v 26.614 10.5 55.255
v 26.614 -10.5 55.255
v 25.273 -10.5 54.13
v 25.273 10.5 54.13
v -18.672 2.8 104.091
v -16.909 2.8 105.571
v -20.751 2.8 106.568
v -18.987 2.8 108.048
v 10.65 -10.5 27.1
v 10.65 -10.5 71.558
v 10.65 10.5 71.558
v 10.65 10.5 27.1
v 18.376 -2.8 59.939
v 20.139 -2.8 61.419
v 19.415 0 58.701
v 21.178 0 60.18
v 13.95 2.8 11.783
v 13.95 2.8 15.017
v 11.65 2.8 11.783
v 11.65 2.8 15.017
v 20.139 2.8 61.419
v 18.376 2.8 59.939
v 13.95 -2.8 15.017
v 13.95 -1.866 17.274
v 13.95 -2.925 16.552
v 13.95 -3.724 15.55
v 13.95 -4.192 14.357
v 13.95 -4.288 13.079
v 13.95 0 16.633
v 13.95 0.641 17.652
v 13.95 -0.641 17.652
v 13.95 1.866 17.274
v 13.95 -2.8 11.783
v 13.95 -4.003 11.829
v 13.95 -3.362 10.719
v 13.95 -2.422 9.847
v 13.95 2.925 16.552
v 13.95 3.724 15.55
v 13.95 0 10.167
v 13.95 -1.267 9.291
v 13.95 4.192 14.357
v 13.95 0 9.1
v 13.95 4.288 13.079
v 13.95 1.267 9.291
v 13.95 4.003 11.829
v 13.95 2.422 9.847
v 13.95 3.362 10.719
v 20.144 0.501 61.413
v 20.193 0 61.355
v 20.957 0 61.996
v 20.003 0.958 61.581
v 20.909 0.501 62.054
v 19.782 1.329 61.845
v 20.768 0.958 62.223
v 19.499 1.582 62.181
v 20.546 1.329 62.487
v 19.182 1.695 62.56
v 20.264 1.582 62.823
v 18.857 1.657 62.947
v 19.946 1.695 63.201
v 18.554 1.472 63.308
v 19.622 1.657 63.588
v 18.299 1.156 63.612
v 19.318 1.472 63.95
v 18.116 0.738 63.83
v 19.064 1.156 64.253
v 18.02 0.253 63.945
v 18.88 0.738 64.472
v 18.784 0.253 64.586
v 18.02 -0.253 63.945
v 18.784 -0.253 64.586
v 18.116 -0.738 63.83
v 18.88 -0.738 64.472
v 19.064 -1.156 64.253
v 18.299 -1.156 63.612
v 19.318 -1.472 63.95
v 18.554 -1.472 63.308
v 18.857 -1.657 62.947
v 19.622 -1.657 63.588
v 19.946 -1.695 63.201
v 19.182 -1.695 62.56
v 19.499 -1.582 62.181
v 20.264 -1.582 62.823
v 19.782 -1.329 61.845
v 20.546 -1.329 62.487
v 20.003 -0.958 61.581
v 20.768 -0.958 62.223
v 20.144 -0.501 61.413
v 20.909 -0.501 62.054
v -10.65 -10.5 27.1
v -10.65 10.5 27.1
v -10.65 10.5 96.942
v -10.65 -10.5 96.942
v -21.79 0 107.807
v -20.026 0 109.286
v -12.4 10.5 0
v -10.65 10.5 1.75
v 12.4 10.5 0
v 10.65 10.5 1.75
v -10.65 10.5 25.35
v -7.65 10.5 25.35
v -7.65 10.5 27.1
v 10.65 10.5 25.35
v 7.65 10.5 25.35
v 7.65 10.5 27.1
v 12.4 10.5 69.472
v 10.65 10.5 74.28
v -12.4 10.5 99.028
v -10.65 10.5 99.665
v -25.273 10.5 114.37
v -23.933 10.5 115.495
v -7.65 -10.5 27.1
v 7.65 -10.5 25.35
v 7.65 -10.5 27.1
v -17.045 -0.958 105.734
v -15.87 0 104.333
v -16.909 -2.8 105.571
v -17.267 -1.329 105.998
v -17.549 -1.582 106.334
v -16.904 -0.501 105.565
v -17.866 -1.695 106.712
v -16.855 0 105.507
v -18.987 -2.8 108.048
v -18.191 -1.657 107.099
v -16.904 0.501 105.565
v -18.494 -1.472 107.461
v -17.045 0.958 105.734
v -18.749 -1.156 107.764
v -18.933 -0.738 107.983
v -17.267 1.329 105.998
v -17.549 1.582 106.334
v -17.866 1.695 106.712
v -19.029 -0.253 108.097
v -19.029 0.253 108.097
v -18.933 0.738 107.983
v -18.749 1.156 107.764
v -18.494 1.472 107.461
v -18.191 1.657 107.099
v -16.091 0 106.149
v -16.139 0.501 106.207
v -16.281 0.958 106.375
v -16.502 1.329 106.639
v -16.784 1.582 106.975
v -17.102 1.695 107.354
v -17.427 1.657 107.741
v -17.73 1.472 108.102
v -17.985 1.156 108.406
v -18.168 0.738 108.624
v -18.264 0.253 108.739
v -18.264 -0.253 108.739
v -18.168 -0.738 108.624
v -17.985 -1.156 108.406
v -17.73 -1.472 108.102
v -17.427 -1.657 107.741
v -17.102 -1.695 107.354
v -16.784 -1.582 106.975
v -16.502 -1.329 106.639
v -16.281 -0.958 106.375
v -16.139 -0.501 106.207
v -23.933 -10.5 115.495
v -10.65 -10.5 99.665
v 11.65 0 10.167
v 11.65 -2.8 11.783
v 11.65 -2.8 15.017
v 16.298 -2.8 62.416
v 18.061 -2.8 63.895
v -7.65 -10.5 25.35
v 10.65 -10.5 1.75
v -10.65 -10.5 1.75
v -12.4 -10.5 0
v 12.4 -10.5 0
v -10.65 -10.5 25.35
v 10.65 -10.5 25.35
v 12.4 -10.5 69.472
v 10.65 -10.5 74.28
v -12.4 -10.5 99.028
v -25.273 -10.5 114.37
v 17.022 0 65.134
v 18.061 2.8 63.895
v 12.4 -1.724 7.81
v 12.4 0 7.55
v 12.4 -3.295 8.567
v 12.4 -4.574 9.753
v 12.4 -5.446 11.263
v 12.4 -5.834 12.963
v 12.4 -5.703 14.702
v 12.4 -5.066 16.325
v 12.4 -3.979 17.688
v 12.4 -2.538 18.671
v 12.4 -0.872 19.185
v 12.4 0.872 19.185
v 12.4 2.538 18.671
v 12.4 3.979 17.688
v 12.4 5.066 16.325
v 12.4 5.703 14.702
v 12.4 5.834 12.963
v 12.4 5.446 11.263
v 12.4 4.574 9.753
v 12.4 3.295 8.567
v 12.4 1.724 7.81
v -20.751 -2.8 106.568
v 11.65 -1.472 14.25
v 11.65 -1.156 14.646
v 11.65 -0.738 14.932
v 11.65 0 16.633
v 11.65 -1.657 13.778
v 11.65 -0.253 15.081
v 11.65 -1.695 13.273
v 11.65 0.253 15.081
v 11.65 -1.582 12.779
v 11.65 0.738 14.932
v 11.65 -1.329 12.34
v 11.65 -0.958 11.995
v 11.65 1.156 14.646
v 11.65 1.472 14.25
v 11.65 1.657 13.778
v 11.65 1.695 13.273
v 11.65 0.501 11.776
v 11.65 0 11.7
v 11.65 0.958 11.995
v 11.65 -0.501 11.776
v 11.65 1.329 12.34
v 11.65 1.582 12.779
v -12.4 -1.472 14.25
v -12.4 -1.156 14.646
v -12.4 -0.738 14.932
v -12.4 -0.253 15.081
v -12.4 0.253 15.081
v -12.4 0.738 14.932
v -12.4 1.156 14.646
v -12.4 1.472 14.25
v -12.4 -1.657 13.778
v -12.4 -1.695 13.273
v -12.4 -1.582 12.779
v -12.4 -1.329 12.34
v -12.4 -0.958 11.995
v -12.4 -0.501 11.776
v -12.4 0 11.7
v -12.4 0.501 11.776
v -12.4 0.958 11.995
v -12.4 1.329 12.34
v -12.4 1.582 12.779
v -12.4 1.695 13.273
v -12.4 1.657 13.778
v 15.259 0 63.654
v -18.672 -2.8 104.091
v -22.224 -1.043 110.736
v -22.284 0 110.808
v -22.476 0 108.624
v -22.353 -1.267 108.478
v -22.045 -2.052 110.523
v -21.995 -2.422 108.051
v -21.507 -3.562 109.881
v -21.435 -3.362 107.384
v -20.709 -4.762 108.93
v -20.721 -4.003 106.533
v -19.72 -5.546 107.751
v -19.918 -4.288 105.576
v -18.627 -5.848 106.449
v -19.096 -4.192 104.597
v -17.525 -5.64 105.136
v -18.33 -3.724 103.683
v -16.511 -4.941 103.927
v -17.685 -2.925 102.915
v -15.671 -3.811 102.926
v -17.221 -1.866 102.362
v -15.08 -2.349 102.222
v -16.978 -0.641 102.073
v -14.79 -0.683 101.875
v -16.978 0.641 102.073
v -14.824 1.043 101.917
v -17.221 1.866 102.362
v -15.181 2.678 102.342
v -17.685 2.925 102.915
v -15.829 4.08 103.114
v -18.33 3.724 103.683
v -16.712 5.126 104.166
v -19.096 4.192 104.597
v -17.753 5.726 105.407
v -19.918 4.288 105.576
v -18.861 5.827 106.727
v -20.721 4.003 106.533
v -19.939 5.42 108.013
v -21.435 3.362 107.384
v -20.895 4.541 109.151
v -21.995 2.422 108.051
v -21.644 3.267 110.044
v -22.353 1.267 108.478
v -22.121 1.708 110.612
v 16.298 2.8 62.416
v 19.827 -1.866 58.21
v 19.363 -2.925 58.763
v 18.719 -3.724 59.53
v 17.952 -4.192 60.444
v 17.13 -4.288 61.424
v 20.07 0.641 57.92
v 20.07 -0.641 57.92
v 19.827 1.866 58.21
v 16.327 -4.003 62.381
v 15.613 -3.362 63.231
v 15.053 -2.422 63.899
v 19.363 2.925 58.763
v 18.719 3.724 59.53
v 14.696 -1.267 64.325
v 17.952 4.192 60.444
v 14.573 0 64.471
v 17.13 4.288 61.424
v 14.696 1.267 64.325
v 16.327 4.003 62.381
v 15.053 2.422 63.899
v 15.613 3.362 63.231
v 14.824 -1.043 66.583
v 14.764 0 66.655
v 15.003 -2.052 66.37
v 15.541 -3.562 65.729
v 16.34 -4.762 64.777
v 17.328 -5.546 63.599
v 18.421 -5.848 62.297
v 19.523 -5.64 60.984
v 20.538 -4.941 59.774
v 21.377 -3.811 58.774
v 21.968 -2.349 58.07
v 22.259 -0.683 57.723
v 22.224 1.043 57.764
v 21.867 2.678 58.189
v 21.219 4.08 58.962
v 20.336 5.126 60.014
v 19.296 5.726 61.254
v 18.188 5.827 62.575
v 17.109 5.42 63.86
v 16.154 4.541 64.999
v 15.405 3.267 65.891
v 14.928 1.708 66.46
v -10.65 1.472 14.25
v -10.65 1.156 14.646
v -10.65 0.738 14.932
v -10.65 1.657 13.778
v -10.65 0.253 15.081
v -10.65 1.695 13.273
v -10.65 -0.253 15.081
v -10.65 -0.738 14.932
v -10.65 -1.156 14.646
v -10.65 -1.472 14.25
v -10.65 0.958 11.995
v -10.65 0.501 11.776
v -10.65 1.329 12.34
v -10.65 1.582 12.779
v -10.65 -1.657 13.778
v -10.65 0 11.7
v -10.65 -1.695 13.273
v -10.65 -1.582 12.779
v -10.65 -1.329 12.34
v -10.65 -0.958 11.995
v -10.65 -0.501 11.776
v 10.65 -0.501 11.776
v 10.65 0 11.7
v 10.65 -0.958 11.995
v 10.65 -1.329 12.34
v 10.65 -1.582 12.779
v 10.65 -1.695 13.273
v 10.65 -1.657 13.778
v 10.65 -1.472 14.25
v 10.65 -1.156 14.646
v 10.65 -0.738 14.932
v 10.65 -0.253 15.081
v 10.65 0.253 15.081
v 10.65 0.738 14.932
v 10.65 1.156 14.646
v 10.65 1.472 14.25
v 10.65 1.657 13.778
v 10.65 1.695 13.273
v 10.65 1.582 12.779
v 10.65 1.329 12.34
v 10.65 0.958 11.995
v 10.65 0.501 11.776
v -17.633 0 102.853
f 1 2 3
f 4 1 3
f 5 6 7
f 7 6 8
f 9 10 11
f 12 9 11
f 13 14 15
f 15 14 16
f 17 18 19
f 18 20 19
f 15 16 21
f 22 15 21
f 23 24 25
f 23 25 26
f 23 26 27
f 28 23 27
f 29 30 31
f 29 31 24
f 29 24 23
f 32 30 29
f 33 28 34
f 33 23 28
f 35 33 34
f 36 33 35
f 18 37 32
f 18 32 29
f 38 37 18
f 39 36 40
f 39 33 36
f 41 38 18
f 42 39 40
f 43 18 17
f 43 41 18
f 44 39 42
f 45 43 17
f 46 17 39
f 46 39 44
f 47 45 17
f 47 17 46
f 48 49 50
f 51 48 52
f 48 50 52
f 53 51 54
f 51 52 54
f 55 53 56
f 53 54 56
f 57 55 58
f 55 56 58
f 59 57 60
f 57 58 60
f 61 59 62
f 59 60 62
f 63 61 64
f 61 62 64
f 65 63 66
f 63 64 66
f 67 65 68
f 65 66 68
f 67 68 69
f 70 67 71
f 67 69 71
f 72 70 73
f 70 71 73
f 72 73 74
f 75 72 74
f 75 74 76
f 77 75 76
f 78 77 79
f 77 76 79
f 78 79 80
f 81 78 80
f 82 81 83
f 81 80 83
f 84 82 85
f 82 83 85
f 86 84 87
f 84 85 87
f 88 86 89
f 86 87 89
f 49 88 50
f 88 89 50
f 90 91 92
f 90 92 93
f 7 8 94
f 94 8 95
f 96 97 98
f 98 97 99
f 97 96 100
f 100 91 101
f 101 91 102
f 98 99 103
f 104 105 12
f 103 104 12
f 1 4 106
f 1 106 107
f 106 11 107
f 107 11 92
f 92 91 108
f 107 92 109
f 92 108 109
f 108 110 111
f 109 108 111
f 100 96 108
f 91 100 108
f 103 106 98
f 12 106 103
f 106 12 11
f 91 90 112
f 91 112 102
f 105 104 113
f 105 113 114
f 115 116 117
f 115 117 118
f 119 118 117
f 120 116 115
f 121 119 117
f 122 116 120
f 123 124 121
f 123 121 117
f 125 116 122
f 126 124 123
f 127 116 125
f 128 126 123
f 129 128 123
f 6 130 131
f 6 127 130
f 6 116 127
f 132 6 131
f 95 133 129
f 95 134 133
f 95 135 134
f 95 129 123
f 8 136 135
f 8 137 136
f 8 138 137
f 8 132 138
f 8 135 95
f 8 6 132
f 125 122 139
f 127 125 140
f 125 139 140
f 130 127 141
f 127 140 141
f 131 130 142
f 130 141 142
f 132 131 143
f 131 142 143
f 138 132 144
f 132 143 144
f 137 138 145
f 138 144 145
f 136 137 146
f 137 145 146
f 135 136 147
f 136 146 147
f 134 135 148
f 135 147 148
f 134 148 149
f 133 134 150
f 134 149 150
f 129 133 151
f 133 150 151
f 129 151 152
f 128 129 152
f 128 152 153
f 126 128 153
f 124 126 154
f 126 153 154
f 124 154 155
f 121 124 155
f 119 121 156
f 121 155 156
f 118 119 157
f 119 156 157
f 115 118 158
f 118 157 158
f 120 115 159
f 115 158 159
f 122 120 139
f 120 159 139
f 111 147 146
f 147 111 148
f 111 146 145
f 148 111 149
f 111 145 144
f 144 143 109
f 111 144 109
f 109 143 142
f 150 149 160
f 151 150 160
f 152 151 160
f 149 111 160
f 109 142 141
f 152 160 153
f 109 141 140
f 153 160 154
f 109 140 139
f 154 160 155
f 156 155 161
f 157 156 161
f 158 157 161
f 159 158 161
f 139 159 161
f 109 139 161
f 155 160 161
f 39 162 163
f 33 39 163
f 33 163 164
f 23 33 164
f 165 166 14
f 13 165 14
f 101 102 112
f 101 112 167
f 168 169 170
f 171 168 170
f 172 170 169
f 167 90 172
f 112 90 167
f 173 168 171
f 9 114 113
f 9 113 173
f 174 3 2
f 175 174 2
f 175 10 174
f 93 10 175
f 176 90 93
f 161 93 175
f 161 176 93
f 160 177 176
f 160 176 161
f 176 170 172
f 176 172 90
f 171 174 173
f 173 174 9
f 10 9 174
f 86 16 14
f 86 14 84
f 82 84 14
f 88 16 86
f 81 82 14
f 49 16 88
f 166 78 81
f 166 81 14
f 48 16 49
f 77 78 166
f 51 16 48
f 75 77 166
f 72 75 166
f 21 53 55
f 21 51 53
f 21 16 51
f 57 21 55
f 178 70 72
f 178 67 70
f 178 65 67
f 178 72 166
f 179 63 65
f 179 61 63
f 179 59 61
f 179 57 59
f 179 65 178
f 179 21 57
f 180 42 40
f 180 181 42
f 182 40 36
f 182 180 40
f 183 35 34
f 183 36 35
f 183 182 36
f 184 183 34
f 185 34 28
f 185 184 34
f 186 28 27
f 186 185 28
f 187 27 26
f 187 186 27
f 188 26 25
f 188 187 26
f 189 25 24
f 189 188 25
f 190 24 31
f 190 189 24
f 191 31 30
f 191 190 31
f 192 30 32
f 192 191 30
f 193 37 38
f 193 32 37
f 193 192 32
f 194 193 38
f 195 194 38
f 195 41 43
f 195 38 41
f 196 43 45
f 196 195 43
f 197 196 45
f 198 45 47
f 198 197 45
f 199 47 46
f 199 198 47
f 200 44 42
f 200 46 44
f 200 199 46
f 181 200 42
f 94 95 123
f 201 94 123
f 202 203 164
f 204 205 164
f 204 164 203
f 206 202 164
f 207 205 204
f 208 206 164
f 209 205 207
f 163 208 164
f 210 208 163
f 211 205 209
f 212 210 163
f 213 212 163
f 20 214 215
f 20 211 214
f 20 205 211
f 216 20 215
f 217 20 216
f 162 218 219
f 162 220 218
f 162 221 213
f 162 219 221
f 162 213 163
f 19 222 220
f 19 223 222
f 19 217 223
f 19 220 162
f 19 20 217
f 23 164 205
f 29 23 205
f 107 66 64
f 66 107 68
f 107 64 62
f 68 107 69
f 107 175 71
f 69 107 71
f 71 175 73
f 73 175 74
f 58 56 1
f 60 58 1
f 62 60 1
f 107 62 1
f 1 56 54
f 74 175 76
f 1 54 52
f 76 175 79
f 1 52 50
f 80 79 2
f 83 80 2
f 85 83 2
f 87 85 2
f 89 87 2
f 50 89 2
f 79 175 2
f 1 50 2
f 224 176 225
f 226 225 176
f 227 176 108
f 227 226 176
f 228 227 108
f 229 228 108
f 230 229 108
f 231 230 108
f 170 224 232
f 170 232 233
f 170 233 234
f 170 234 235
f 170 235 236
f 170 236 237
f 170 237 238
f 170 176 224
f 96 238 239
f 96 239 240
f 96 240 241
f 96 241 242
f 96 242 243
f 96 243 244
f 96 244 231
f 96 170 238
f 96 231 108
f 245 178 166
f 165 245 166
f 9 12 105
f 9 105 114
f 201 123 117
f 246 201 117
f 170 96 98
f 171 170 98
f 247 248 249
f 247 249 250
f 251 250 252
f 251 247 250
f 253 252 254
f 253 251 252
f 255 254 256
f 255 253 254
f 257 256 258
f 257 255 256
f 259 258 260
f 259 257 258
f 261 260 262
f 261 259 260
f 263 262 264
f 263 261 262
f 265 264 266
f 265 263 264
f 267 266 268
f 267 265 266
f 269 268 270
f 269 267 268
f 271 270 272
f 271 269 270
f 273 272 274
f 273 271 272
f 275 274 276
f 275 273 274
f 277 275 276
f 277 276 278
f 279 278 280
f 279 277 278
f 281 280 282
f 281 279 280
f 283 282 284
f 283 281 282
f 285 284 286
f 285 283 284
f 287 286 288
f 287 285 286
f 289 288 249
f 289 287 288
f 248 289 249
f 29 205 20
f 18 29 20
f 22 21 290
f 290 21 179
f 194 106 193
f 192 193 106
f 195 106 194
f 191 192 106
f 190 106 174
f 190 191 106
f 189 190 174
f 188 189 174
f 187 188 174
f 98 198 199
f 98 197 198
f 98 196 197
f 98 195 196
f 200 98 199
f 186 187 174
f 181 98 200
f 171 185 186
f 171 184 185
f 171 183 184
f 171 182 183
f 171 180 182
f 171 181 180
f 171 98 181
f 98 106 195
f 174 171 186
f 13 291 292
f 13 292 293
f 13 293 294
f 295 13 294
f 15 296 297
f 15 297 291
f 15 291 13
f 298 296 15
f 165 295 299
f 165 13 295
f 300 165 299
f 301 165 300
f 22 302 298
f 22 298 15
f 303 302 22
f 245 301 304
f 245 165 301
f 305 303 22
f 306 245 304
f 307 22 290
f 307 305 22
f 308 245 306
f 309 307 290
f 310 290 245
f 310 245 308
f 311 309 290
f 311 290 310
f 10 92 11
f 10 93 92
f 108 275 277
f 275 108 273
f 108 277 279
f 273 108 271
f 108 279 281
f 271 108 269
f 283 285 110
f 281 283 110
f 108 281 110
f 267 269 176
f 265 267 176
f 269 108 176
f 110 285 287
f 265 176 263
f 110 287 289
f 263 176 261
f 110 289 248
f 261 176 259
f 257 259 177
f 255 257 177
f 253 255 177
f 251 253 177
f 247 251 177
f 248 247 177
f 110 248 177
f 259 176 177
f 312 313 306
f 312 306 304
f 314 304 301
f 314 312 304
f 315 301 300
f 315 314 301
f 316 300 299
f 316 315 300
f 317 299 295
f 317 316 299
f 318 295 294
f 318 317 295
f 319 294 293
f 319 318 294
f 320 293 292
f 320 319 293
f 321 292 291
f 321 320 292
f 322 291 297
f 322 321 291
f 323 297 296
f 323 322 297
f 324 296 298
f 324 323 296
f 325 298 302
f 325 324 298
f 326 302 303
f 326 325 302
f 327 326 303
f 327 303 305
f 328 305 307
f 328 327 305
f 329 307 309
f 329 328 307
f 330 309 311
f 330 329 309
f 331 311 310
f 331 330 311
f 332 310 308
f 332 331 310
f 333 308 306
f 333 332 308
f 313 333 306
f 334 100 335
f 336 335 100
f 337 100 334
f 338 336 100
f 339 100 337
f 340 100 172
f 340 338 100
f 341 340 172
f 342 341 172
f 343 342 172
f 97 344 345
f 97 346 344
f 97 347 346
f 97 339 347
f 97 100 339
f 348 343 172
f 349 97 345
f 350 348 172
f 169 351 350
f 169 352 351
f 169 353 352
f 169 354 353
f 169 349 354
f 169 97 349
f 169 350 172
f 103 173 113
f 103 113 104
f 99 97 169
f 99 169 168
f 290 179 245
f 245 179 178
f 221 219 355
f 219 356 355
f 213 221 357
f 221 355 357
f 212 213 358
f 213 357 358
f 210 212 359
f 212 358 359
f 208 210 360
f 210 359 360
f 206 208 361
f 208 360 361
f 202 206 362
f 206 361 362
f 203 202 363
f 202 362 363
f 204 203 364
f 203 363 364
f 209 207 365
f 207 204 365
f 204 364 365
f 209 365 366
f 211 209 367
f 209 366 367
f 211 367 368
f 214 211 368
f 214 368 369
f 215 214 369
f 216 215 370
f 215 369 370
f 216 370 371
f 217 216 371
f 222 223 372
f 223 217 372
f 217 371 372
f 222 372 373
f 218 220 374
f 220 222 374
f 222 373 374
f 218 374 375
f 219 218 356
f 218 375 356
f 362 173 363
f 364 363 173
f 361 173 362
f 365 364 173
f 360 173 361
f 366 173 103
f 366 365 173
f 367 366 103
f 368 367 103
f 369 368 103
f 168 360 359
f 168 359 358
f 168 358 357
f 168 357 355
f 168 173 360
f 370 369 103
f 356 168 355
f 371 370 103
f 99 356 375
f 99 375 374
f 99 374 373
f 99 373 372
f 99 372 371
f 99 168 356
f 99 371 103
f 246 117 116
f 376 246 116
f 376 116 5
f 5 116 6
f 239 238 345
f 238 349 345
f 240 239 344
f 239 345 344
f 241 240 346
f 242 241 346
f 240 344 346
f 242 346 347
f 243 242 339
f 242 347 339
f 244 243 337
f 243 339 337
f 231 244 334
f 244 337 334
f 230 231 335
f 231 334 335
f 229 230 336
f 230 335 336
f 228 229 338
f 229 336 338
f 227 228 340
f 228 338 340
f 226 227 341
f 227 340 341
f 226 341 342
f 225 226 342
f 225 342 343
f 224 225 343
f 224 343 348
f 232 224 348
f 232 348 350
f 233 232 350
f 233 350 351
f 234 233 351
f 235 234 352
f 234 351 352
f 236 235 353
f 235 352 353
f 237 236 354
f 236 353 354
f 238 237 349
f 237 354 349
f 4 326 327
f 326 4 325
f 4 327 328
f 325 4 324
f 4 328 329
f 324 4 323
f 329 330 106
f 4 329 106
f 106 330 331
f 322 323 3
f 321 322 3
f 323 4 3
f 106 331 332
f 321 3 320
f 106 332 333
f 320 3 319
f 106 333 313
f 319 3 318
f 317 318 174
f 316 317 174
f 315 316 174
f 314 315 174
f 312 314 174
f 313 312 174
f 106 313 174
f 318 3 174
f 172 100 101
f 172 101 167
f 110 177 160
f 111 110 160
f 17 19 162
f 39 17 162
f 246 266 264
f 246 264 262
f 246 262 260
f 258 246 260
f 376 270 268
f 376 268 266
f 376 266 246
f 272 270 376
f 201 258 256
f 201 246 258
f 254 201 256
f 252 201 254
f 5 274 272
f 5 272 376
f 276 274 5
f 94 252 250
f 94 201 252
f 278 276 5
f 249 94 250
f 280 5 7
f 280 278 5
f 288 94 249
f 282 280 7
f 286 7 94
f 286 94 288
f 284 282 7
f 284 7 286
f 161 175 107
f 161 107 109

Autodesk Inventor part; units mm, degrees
ref_plane "YZ Plane" through (0, 0, 0) normal (1, 0, 0) x (0, 1, 0)
ref_plane "XZ Plane" through (0, 0, 0) normal (0, 1, 0) x (-1, 0, 0)
sketch "Sketch1" plane through (0, 0, 0) normal (0, 0, 1) x (1, 0, 0)
  line L0 (-12.4, 10.5) -> (12.4, 10.5)
  line L1 (12.4, 10.5) -> (12.4, -10.5)
  line L2 (12.4, -10.5) -> (-12.4, -10.5)
  line L3 (-12.4, -10.5) -> (-12.4, 10.5)
  point P0 (0, 0)
  point P1 (-12.4, 0)
  point P2 (0, 10.5)
  dimension "d0" = 24.8
  dimension "d1" = 21
extrude "Extrusion1" add sketch "Sketch1" along normal blind 1.75
ref_plane "Work Plane1" through (0, 0, 84.25) normal (0, 0, 1) x (1, 0, 0)
sketch "Sketch3" plane through (0, 0, 84.25) normal (0, 0, 1) x (1, 0, 0)
  line L0 (0, 9.7015) -> (0, -9.7015) construction
  point P0 (0, 0)
  point P1 (0, 0)
ref_plane "Work Plane2" through (0, 9.7015, 84.25) normal (0.7660444, 0, 0.6427876) x (0, -1, 0)
sketch "Sketch2" plane through (0, 0, 1.75) normal (0, 0, 1) x (1, 0, 0)
  line L0 (12.4, 10.5) -> (12.4, -10.5) projected
  line L1 (-12.4, 10.5) -> (12.4, 10.5) projected
  line L2 (12.4, -10.5) -> (-12.4, -10.5) projected
  line L3 (-12.4, 10.5) -> (-10.65, 10.5)
  line L4 (-10.65, 10.5) -> (-10.65, -10.5)
  line L5 (-10.65, -10.5) -> (-12.4, -10.5)
  line L6 (-12.4, -10.5) -> (-12.4, 10.5)
  line L7 (12.4, -10.5) -> (10.65, -10.5)
  line L8 (10.65, -10.5) -> (10.65, 10.5)
  line L9 (10.65, 10.5) -> (12.4, 10.5)
  line L10 (12.4, 10.5) -> (12.4, -10.5)
  point P0 (0, 0)
  dimension "d4" = 1.75
  dimension "d5" = 1.75
extrude "Extrusion2" add sketch "Sketch2" along normal up to surface contours L0 L2 L8 L1 | L4 L2 L6 L1 surface through (0, 9.7015, 84.25) normal (0.7660444, 0, 0.6427876)
sketch "Sketch4" plane through (-12.4, -10.5, 0) normal (0, -1, 0) x (1, 0, 0)
  line L0 (1.75, 96.9422) -> (0, 99.0277) projected
  line L1 (24.8, 69.4723) -> (23.05, 71.5578) projected
  line L2 (23.05, 1.75) -> (23.05, 71.5578) projected
  line L3 (23.05, 71.5578) -> (23.05, 74.2803)
  line L4 (23.05, 74.2803) -> (39.014, 55.2552)
  line L5 (39.014, 55.2552) -> (37.6734, 54.1303)
  line L6 (37.6734, 54.1303) -> (24.8, 69.4723)
  line L7 (0, 99.0277) -> (-12.8734, 114.3697)
  line L8 (-12.8734, 114.3697) -> (-11.5328, 115.4946)
  line L9 (-11.5328, 115.4946) -> (1.75, 99.6647)
  line L10 (1.75, 99.6647) -> (1.75, 96.9422)
  line L11 (24.8, 0) -> (24.8, 69.4723) projected
  line L12 (23.05, 71.5578) -> (23.05, 74.2803)
  line L13 (23.05, 74.2803) -> (1.75, 99.6647)
  line L14 (1.75, 99.6647) -> (1.75, 96.9422)
  line L15 (1.75, 96.9422) -> (23.05, 71.5578)
  point P0 (12.4, 0)
  dimension "d10" = 1.75
  dimension "d11" = 22.75
  dimension "d12" = 1.75
  dimension "d13" = 22.75
extrude "Extrusion3" add sketch "Sketch4" against normal up to surface (21 mm away)
sketch "Sketch5" plane through (-10.65, -10.5, 1.75) normal (1, 0, 0) x (0, 0, -1)
  line L0 (0, 0) -> (-95.1922, 0) projected
  line L1 (0, 21) -> (-23.3, 21)
  line L2 (-23.3, 21) -> (-23.3, 0)
  line L3 (-23.3, 0) -> (0, 0)
  line L4 (0, 0) -> (0, 21)
  circle A0 centre (-11.65, 10.5) radius 1.7
  point P0 (-97.7359, 0)
  point P1 (1.75, 10.5)
  dimension "d16" = 23.3
  dimension "d17" = 3.4
extrude "Extrusion4" cut sketch "Sketch5" against normal up to surface (1.75 mm away) contours A0
mirror "Mirror1" about plane through (0, 0, 0) normal (1, 0, 0) of "Extrusion4"
sketch "Sketch8" plane through (-23.9328, -10.5, 115.4946) normal (0.7660444, 0, 0.6427876) x (0.6427876, 0, -0.7660444)
  line L0 (0, 0) -> (0, 21) projected
  line L1 (78.6369, 0) -> (78.6369, 21) projected
  circle A0 centre (10.5, 10.5) radius 1.7
  circle A1 centre (68.1369, 10.5) radius 1.7
  point P0 (103.8577, 10.5)
  point P1 (0, 10.5)
  point P2 (78.6369, 10.5)
  dimension "d25" = 3.4
  dimension "d26" = 3.4
  dimension "d27" = 10.5
  dimension "d28" = 10.5
extrude "Extrusion6" cut sketch "Sketch8" against normal up to surface (1.75 mm away)
sketch "Sketch9" plane through (-12.4, -10.5, 99.0277) normal (-0.7660444, 0, -0.6427876) x (-0.6427876, 0, 0.7660444)
  circle A0 centre (9.5275, 10.5) radius 1.7 projected
  line L0 (20.0275, 21) -> (0, 21) projected
  circle A1 centre (9.5275, 10.5) radius 4.3
  line L1 (11.1441, 7.7) -> (7.9109, 7.7)
  line L2 (7.9109, 7.7) -> (6.2943, 10.5)
  line L3 (6.2943, 10.5) -> (7.9109, 13.3)
  line L4 (7.9109, 13.3) -> (11.1441, 13.3)
  line L5 (11.1441, 13.3) -> (12.7606, 10.5)
  line L6 (12.7606, 10.5) -> (11.1441, 7.7)
  circle A2 centre (-48.1094, 10.5) radius 1.7 projected
  line L7 (-38.582, 21) -> (-58.6094, 21) projected
  circle A3 centre (-48.1094, 10.5) radius 4.3
  line L8 (-46.4929, 7.7) -> (-49.726, 7.7)
  line L9 (-49.726, 7.7) -> (-51.3426, 10.5)
  line L10 (-51.3426, 10.5) -> (-49.726, 13.3)
  line L11 (-49.726, 13.3) -> (-46.4929, 13.3)
  line L12 (-46.4929, 13.3) -> (-44.8763, 10.5)
  line L13 (-44.8763, 10.5) -> (-46.4929, 7.7)
  point P0 (-83.8302, 10.5)
  dimension "d31" = 5.6
  dimension "d32" = 1.5
  dimension "d38" = 5.6
  dimension "d39" = 1.5
extrude "Extrusion7" cut sketch "Sketch9" against normal blind 0.75 contours L1 L2 L3 L4 L5 L6
extrude "Extrusion8" add sketch "Sketch9" along normal blind 1.55 contours A1
draft "FaceDraft1" angle 45 pull direction (-0.7660444, 0, -0.6427876) faces at (-22.0708, -0.346, 108.9453) fixed edges at (-16.9475, 0, 102.0359)
extrude "Extrusion9" cut sketch "Sketch9" against normal blind 0.75 contours L8 L9 L10 L11 L12 L13
extrude "Extrusion10" add sketch "Sketch9" along normal blind 1.55 contours A3
draft "FaceDraft2" angle 45 pull direction (-0.7660444, 0, -0.6427876) faces at (15.0044, -0.6898, 64.7609) fixed edges at (20.1008, 0, 57.8835)
sketch "Sketch10" plane through (12.4, -10.5, 0) normal (1, 0, 0) x (0, 0, -1)
  circle A0 centre (-13.4, 10.5) radius 1.7 projected
  line L0 (0, 21) -> (-69.4723, 21) projected
  circle A1 centre (-13.4, 10.5) radius 4.3
  line L1 (-11.7834, 7.7) -> (-15.0166, 7.7)
  line L2 (-15.0166, 7.7) -> (-16.6332, 10.5)
  line L3 (-16.6332, 10.5) -> (-15.0166, 13.3)
  line L4 (-15.0166, 13.3) -> (-11.7834, 13.3)
  line L5 (-11.7834, 13.3) -> (-10.1668, 10.5)
  line L6 (-10.1668, 10.5) -> (-11.7834, 7.7)
  point P0 (0, 10.5)
  dimension "d45" = 5.6
  dimension "d46" = 1.5
extrude "Extrusion11" cut sketch "Sketch10" against normal blind 0.75 contours L1 L2 L3 L4 L5 L6
extrude "Extrusion12" add sketch "Sketch10" along normal blind 1.55 contours A1
draft "FaceDraft3" angle 45 pull direction (1, 0, 0) faces at (12.9167, -0.6898, 9.1557) fixed edges at (13.95, 0, 17.7)
sketch "Sketch11" plane through (-10.65, -10.5, 1.75) normal (1, 0, 0) x (0, 0, -1)
  line L0 (0, 0) -> (-95.1922, 0) projected
  line L1 (0, 21) -> (0, 0) projected
  line L2 (0, 21) -> (-95.1922, 21) projected
  line L3 (-25.35, 21) -> (-23.6, 21)
  line L4 (-23.6, 21) -> (-23.6, 0)
  line L5 (-23.6, 0) -> (-25.35, 0)
  line L6 (-25.35, 0) -> (-25.35, 21)
  point P0 (1.75, 10.5)
  dimension "d52" = 1.75
  dimension "d53" = 23.6
extrude "Extrusion13" add sketch "Sketch11" along normal blind 3 contours L0 L6 L2 L4
mirror "Mirror2" about plane through (0, 0, 0) normal (1, 0, 0) of "Extrusion13"
equation "\"d4\" = d5"
equation "\"d12\" = d10"
equation "\"d26\" = d25"
equation "\"d28\" = d27"
properties part number "carousel_mount_bracket"
